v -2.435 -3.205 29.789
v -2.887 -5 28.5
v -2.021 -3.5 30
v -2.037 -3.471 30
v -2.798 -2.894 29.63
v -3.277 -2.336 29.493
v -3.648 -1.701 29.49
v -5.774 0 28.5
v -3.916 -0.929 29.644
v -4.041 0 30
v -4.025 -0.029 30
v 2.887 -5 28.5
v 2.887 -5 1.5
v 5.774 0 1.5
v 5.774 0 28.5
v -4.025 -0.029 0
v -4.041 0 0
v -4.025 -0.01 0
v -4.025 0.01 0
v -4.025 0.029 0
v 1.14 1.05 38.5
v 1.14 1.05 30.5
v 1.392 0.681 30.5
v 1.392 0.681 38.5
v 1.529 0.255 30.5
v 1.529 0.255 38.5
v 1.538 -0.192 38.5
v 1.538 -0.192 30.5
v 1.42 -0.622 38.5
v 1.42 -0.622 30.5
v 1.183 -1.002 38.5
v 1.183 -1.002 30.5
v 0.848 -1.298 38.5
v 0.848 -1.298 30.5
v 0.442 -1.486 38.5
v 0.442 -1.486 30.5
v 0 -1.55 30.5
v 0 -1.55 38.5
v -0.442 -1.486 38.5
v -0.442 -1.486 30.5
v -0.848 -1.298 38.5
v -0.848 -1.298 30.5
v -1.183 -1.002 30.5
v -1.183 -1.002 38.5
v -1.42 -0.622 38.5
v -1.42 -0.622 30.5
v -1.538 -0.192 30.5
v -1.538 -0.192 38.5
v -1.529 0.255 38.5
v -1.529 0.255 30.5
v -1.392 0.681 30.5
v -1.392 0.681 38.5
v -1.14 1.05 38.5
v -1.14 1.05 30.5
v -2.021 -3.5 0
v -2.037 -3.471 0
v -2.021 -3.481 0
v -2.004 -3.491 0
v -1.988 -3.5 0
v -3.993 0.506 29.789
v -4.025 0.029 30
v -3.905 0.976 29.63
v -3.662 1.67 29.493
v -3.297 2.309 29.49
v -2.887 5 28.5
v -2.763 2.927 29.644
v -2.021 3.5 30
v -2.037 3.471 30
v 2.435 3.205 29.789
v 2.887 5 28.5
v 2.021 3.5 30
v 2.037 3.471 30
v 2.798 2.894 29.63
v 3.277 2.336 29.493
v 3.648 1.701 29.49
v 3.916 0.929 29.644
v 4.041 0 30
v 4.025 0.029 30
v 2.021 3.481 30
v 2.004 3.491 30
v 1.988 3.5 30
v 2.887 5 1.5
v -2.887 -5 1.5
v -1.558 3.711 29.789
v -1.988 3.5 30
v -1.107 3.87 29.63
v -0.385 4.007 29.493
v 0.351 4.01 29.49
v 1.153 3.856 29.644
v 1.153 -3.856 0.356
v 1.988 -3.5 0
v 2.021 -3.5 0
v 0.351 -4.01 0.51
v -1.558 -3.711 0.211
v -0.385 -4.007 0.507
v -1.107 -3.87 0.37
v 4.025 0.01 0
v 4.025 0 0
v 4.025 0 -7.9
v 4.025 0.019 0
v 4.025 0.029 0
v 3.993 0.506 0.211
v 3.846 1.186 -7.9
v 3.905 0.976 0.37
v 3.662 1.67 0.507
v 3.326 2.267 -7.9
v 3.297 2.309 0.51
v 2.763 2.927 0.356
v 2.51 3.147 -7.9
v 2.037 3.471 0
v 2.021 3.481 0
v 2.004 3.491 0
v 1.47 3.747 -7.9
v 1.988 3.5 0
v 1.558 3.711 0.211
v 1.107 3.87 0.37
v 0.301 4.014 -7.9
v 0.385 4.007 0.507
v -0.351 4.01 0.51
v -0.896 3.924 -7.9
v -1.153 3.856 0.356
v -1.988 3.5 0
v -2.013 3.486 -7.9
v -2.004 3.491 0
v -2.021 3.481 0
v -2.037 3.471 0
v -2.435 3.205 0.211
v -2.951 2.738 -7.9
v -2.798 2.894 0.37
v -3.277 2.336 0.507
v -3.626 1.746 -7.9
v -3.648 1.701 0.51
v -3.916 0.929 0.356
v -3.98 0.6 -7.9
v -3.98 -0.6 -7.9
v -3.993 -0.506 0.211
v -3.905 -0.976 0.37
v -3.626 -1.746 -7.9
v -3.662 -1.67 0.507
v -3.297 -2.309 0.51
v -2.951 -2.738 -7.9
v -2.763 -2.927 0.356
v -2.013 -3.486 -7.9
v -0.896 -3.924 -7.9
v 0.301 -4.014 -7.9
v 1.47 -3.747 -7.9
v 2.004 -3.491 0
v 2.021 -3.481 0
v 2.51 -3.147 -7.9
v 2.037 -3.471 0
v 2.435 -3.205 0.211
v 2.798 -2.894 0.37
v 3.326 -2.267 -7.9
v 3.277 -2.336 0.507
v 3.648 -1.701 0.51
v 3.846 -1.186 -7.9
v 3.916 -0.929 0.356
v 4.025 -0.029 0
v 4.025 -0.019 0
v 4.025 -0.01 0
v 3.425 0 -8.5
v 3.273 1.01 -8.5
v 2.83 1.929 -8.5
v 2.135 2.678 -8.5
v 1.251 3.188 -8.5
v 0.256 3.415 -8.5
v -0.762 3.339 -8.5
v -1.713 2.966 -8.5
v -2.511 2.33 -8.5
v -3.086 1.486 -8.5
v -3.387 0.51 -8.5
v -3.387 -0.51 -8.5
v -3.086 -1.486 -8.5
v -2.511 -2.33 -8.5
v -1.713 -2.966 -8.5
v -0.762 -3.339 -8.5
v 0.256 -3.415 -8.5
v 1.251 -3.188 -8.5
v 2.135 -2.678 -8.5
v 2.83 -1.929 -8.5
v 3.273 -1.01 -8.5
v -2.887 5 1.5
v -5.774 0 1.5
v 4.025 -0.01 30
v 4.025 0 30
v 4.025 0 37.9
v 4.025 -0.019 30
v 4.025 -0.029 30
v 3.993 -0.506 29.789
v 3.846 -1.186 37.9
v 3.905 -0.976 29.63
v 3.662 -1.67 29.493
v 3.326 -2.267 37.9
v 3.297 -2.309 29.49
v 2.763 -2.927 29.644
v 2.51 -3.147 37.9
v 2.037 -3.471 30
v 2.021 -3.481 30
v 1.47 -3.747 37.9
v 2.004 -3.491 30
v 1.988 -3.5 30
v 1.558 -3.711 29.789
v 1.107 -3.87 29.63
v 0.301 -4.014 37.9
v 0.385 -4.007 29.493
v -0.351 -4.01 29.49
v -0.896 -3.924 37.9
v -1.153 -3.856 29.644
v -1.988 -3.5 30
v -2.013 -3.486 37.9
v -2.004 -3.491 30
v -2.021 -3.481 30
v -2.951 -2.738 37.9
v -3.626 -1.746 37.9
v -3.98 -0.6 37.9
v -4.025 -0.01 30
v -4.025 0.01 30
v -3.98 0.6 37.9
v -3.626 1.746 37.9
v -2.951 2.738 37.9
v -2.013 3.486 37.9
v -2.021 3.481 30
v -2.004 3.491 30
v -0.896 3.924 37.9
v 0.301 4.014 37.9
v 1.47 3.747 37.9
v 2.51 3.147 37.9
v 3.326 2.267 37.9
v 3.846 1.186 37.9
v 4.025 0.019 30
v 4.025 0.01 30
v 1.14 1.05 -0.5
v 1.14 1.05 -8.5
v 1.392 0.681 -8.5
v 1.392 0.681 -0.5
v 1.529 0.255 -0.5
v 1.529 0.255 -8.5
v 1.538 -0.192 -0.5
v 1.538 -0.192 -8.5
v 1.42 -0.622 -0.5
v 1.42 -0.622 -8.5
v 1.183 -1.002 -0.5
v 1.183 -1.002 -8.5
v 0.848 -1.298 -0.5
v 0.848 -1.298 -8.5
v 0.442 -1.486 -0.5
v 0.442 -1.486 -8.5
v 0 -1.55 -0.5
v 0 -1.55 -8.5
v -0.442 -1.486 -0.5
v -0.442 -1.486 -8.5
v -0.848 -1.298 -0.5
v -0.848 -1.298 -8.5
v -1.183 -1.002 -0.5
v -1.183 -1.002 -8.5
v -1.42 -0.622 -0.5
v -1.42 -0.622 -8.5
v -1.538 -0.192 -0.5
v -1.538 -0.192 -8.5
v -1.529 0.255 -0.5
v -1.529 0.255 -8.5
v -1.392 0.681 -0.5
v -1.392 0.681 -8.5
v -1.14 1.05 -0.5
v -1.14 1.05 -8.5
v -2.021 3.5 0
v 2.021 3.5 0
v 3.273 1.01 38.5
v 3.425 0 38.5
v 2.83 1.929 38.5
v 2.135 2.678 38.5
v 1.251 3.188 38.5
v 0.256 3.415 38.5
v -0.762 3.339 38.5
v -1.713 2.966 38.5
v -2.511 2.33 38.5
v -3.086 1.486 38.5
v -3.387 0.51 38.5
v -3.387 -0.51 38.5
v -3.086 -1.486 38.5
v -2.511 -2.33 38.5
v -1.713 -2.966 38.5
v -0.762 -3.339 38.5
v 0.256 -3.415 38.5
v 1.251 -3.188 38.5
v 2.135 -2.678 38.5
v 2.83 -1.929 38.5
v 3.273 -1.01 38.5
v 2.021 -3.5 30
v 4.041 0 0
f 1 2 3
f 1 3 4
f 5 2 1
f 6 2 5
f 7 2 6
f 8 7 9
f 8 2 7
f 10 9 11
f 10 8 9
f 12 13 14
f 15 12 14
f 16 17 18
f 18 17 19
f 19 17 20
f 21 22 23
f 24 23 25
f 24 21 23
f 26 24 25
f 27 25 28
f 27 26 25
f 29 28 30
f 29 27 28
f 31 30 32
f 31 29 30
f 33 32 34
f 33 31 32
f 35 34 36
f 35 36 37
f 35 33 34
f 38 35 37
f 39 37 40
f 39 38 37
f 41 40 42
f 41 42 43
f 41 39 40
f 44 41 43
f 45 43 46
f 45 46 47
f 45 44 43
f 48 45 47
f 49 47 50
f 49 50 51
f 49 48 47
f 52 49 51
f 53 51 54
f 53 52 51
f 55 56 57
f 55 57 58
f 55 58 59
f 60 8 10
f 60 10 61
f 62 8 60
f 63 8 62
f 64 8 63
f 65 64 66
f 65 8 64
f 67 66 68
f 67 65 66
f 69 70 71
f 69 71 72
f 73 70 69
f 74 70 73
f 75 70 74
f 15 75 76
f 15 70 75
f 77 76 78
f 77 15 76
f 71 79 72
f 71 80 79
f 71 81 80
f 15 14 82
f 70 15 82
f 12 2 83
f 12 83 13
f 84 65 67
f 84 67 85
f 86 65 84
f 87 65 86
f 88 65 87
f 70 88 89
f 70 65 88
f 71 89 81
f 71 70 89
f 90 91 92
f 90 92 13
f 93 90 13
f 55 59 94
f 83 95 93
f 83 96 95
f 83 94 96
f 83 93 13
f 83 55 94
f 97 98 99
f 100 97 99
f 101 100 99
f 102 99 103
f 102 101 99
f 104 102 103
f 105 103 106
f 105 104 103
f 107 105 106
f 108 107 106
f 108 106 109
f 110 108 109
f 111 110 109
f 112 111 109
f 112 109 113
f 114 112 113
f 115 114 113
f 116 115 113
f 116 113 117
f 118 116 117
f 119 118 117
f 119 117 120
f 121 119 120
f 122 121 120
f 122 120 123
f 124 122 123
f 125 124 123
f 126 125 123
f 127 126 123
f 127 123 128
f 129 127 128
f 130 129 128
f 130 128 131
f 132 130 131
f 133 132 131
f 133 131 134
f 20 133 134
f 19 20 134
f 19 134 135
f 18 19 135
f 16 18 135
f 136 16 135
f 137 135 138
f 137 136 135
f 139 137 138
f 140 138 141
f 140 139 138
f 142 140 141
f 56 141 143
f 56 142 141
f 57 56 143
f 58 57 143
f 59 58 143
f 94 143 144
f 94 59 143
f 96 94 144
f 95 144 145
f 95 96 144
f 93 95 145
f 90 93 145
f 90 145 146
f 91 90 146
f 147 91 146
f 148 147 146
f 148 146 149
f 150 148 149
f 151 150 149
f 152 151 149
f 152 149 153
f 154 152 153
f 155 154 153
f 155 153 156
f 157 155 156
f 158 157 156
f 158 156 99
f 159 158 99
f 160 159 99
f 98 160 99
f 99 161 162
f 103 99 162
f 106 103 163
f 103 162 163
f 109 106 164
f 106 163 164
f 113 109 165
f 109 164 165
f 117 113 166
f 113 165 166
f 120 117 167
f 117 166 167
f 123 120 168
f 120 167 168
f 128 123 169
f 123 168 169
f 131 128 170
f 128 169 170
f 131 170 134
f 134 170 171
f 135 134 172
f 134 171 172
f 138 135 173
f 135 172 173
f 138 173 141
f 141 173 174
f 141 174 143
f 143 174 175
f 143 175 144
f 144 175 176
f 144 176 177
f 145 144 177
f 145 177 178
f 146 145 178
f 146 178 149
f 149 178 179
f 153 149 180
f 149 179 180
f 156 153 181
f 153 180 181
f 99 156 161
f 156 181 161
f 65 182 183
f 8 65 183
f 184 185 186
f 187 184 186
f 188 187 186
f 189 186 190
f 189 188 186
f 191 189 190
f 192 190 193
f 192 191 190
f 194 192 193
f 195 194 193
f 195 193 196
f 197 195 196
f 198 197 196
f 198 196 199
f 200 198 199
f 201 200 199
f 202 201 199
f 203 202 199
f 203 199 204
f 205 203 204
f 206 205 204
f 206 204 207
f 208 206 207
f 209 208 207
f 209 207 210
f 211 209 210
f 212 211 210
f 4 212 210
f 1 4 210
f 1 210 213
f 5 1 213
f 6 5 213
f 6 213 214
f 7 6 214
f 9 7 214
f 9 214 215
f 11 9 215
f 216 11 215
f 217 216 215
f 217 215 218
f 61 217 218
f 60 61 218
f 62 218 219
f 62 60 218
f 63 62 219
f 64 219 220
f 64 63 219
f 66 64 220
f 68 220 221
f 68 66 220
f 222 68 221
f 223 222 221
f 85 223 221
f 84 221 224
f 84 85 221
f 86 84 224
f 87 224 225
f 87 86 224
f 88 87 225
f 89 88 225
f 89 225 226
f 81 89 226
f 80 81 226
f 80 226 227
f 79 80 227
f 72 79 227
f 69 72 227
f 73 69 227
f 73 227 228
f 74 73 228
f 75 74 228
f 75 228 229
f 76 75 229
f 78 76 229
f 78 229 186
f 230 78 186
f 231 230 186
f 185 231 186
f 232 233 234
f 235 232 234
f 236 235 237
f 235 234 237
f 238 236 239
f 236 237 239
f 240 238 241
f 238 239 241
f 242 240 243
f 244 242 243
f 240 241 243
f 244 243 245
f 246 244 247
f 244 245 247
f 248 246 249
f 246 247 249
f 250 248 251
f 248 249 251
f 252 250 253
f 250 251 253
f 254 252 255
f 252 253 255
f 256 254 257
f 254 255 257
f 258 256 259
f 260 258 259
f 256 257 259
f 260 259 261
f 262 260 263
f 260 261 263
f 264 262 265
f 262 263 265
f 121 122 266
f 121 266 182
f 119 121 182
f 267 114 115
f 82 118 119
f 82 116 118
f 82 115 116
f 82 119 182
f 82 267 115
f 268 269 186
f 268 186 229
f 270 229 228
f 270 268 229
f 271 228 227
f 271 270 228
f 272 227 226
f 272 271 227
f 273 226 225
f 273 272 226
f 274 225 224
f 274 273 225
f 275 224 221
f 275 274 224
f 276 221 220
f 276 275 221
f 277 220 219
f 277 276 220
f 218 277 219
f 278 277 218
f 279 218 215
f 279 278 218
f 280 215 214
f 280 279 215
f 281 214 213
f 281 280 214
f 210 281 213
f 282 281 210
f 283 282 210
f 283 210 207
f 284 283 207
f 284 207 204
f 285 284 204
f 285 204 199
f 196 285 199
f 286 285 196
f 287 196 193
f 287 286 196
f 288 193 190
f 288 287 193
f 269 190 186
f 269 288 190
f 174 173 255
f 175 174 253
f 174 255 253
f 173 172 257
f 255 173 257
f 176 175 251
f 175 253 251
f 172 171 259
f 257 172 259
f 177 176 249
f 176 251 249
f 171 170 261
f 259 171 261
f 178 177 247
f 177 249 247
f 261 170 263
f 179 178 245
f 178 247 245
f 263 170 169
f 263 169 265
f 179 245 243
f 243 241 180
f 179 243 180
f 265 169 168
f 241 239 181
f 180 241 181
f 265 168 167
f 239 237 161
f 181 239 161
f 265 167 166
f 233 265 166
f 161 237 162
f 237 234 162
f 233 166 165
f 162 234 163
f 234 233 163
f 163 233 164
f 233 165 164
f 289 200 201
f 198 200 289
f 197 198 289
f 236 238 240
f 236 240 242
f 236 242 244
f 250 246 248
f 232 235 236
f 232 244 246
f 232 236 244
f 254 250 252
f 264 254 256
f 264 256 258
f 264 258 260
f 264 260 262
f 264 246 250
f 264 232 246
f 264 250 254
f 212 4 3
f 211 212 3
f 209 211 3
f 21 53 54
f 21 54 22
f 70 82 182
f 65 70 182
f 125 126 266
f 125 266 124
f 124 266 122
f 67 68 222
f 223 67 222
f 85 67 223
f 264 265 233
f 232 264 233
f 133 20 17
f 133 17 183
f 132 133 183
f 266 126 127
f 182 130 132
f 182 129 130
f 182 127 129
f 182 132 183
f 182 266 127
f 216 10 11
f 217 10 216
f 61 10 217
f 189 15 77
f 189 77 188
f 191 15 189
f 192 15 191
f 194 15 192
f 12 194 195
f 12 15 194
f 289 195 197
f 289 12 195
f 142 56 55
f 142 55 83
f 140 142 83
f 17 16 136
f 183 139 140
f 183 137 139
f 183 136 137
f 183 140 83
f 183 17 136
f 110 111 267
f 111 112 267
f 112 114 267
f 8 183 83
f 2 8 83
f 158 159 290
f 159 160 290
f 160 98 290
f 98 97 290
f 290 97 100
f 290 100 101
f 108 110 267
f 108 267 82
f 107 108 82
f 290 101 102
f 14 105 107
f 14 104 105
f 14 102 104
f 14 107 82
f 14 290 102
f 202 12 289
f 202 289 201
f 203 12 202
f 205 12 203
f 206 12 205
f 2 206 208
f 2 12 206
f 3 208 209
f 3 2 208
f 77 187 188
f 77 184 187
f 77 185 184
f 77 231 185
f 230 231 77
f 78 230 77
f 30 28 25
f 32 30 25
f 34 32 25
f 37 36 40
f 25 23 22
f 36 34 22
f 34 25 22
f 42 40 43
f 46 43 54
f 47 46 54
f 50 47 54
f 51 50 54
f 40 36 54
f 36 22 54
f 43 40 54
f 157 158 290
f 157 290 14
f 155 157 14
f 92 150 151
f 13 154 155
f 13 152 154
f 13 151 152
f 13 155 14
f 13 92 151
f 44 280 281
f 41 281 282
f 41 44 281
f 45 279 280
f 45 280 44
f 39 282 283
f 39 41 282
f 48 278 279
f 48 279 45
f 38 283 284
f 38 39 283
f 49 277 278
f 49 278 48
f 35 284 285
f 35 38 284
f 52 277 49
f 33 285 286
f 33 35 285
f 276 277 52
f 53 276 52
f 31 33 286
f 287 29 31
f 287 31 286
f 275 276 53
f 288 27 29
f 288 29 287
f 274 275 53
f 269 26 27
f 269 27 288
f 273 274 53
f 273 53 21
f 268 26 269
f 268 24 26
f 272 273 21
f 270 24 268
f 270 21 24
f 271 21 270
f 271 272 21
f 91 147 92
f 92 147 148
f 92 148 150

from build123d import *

# Parameters (mm, degrees)
EXTRUDE_1_DEPTH            = 30
SKETCH_2_R                 = 4.025
EXTRUDE_2_DEPTH            = 8.5
CHAMFER_1_SIZE             = 0.6
CUT_EXTRUDE_1_DEPTH        = 8
CHAMFER_1_OF_MIRROR_1_SIZE = 0.6
CHAMFER_2_SIZE             = 1.5


with BuildPart() as part:
    # 草图1 → 凸台-拉伸1 (new body)
    with BuildSketch(Plane.XY):
        Polygon((5.773502692, 0), (2.886751346, 5), (-2.886751346, 5), (-5.773502692, 0), (-2.886751346, -5), (2.886751346, -5), align=None)
    extrude(amount=EXTRUDE_1_DEPTH)

    # 草图2 → 凸台-拉伸2 (add)
    with BuildSketch(Plane.XY.offset(30)):
        Circle(SKETCH_2_R)
    extrude_2 = extrude(amount=EXTRUDE_2_DEPTH)

    # 倒角1
    chamfer_1_edges = [part.edges().sort_by_distance(p)[0] for p in [
        (-4.025, 0, 38.5),
    ]]
    chamfer(chamfer_1_edges, length=CHAMFER_1_SIZE)

    # 草图3 → 切除-拉伸1 (cut)
    with BuildSketch(Plane.XY.offset(38.5)):
        with BuildLine():
            Line((-1.140175425, 1.05), (1.140175425, 1.05))
            ThreePointArc((1.140175425, 1.05), (0, -1.55), (-1.140175425, 1.05))
        make_face()
    cut_extrude_1 = extrude(amount=-CUT_EXTRUDE_1_DEPTH, mode=Mode.SUBTRACT)

    # 镜向1: 凸台-拉伸2, 切除-拉伸1 across plane
    add(extrude_2.mirror(Plane.XY.offset(15)))
    add(cut_extrude_1.mirror(Plane.XY.offset(15)), mode=Mode.SUBTRACT)

    # 倒角1 of 镜向1
    chamfer_1_of_mirror_1_edges = [part.edges().sort_by_distance(p)[0] for p in [
        (-4.025, 0, -8.5),
    ]]
    chamfer(chamfer_1_of_mirror_1_edges, length=CHAMFER_1_OF_MIRROR_1_SIZE)

    # 倒角2
    # the kernel refuses this chamfer: 1.5 mm, written as the material it takes off along each edge
    with BuildSketch(Plane(origin=(6.744275828, 5, 30), x_dir=(0, 0.02749587661058619, -0.9996219169112968), z_dir=(-1, 0, 0))) as chamfer_2_piece_1_section:
        Polygon((CHAMFER_2_SIZE * 0.999621916911, CHAMFER_2_SIZE * 0.0274958766106), (-CHAMFER_2_SIZE * 0.0274958766106, CHAMFER_2_SIZE * 0.999621916911), (0, 0), align=None)
    chamfer_2_piece_1 = extrude(amount=13.488551656, mode=Mode.PRIVATE)
    chamfer_2_piece_1 = chamfer_2_piece_1 - Plane(origin=(0, 0, 29.496283427), x_dir=(1, 0, 0), z_dir=(0, 0, -1)) * Cylinder(4.025, 33, mode=Mode.PRIVATE)
    add(chamfer_2_piece_1, mode=Mode.SUBTRACT)
    with BuildSketch(Plane(origin=(-0.957989105, 8.340714197, 30), x_dir=(-0.02381212764409015, 0.013747938305292993, -0.9996219169112968), z_dir=(-0.49999999999999506, -0.8660254037844416, 0))) as chamfer_2_piece_2_section:
        Polygon((CHAMFER_2_SIZE * 0.999621916911, CHAMFER_2_SIZE * 0.0274958766106), (-CHAMFER_2_SIZE * 0.0274958766106, CHAMFER_2_SIZE * 0.999621916911), (0, 0), align=None)
    chamfer_2_piece_2 = extrude(amount=13.488551656, mode=Mode.PRIVATE)
    chamfer_2_piece_2 = chamfer_2_piece_2 - Plane(origin=(0, 0, 29.496283427), x_dir=(1, 0, 0), z_dir=(0, 0, -1)) * Cylinder(4.025, 33, mode=Mode.PRIVATE)
    add(chamfer_2_piece_2, mode=Mode.SUBTRACT)
    with BuildSketch(Plane(origin=(-7.702264933, 3.340714197, 30), x_dir=(-0.023812127644089943, -0.013747938305293316, -0.9996219169112968), z_dir=(0.5000000000000071, -0.8660254037844346, 0))) as chamfer_2_piece_3_section:
        Polygon((CHAMFER_2_SIZE * 0.999621916911, CHAMFER_2_SIZE * 0.0274958766106), (-CHAMFER_2_SIZE * 0.0274958766106, CHAMFER_2_SIZE * 0.999621916911), (0, 0), align=None)
    chamfer_2_piece_3 = extrude(amount=13.488551656, mode=Mode.PRIVATE)
    chamfer_2_piece_3 = chamfer_2_piece_3 - Plane(origin=(0, 0, 29.496283427), x_dir=(1, 0, 0), z_dir=(0, 0, -1)) * Cylinder(4.025, 33, mode=Mode.PRIVATE)
    add(chamfer_2_piece_3, mode=Mode.SUBTRACT)
    with BuildSketch(Plane(origin=(-6.744275828, -5, 30), x_dir=(0, -0.02749587661058619, -0.9996219169112968), z_dir=(1, 0, 0))) as chamfer_2_piece_4_section:
        Polygon((CHAMFER_2_SIZE * 0.999621916911, CHAMFER_2_SIZE * 0.0274958766106), (-CHAMFER_2_SIZE * 0.0274958766106, CHAMFER_2_SIZE * 0.999621916911), (0, 0), align=None)
    chamfer_2_piece_4 = extrude(amount=13.488551656, mode=Mode.PRIVATE)
    chamfer_2_piece_4 = chamfer_2_piece_4 - Plane(origin=(0, 0, 29.496283427), x_dir=(1, 0, 0), z_dir=(0, 0, -1)) * Cylinder(4.025, 33, mode=Mode.PRIVATE)
    add(chamfer_2_piece_4, mode=Mode.SUBTRACT)
    with BuildSketch(Plane(origin=(0.957989105, -8.340714197, 30), x_dir=(0.02381212764409026, -0.013747938305293058, -0.9996219169112968), z_dir=(0.49999999999999506, 0.8660254037844416, 0))) as chamfer_2_piece_5_section:
        Polygon((CHAMFER_2_SIZE * 0.999621916911, CHAMFER_2_SIZE * 0.0274958766106), (-CHAMFER_2_SIZE * 0.0274958766106, CHAMFER_2_SIZE * 0.999621916911), (0, 0), align=None)
    chamfer_2_piece_5 = extrude(amount=13.488551656, mode=Mode.PRIVATE)
    chamfer_2_piece_5 = chamfer_2_piece_5 - Plane(origin=(0, 0, 29.496283427), x_dir=(1, 0, 0), z_dir=(0, 0, -1)) * Cylinder(4.025, 33, mode=Mode.PRIVATE)
    add(chamfer_2_piece_5, mode=Mode.SUBTRACT)
    with BuildSketch(Plane(origin=(-6.744275828, -5, 0), x_dir=(-1.0610740769848241e-14, 0.9996219169112969, -0.027495876610586372), z_dir=(1, 0, 0))) as chamfer_2_piece_6_section:
        Polygon((CHAMFER_2_SIZE * 0.999621916911, CHAMFER_2_SIZE * 0.0274958766106), (-CHAMFER_2_SIZE * 0.0274958766106, CHAMFER_2_SIZE * 0.999621916911), (0, 0), align=None)
    chamfer_2_piece_6 = extrude(amount=13.488551656, mode=Mode.PRIVATE)
    chamfer_2_piece_6 = chamfer_2_piece_6 - Plane(origin=(0, 0, 0.503716575), x_dir=(1, 0, 0), z_dir=(0, 0, 1)) * Cylinder(4.025, 33, mode=Mode.PRIVATE)
    add(chamfer_2_piece_6, mode=Mode.SUBTRACT)
    with BuildSketch(Plane(origin=(-7.702264933, 3.340714197, 0), x_dir=(0.8656979742248763, 0.49981095845565543, -0.027495876610586372), z_dir=(0.5000000000000071, -0.8660254037844346, 0))) as chamfer_2_piece_7_section:
        Polygon((CHAMFER_2_SIZE * 0.999621916911, CHAMFER_2_SIZE * 0.0274958766106), (-CHAMFER_2_SIZE * 0.0274958766106, CHAMFER_2_SIZE * 0.999621916911), (0, 0), align=None)
    chamfer_2_piece_7 = extrude(amount=13.488551656, mode=Mode.PRIVATE)
    chamfer_2_piece_7 = chamfer_2_piece_7 - Plane(origin=(0, 0, 0.503716575), x_dir=(1, 0, 0), z_dir=(0, 0, 1)) * Cylinder(4.025, 33, mode=Mode.PRIVATE)
    add(chamfer_2_piece_7, mode=Mode.SUBTRACT)
    with BuildSketch(Plane(origin=(-0.957989105, 8.340714197, 0), x_dir=(0.8656979742248831, -0.4998109584556434, -0.027495876610586365), z_dir=(-0.49999999999999506, -0.8660254037844416, 0))) as chamfer_2_piece_8_section:
        Polygon((CHAMFER_2_SIZE * 0.999621916911, CHAMFER_2_SIZE * 0.0274958766106), (-CHAMFER_2_SIZE * 0.0274958766106, CHAMFER_2_SIZE * 0.999621916911), (0, 0), align=None)
    chamfer_2_piece_8 = extrude(amount=13.488551656, mode=Mode.PRIVATE)
    chamfer_2_piece_8 = chamfer_2_piece_8 - Plane(origin=(0, 0, 0.503716575), x_dir=(1, 0, 0), z_dir=(0, 0, 1)) * Cylinder(4.025, 33, mode=Mode.PRIVATE)
    add(chamfer_2_piece_8, mode=Mode.SUBTRACT)
    with BuildSketch(Plane(origin=(6.744275828, 5, 0), x_dir=(3.2293558864755513e-15, -0.9996219169112969, -0.027495876610586372), z_dir=(-1, 0, 0))) as chamfer_2_piece_9_section:
        Polygon((CHAMFER_2_SIZE * 0.999621916911, CHAMFER_2_SIZE * 0.0274958766106), (-CHAMFER_2_SIZE * 0.0274958766106, CHAMFER_2_SIZE * 0.999621916911), (0, 0), align=None)
    chamfer_2_piece_9 = extrude(amount=13.488551656, mode=Mode.PRIVATE)
    chamfer_2_piece_9 = chamfer_2_piece_9 - Plane(origin=(0, 0, 0.503716575), x_dir=(1, 0, 0), z_dir=(0, 0, 1)) * Cylinder(4.025, 33, mode=Mode.PRIVATE)
    add(chamfer_2_piece_9, mode=Mode.SUBTRACT)
    with BuildSketch(Plane(origin=(7.702264933, -3.340714197, 0), x_dir=(-0.8656979742248797, -0.49981095845564943, -0.027495876610586372), z_dir=(-0.5000000000000011, 0.866025403784438, 0))) as chamfer_2_piece_10_section:
        Polygon((CHAMFER_2_SIZE * 0.999621916911, CHAMFER_2_SIZE * 0.0274958766106), (-CHAMFER_2_SIZE * 0.0274958766106, CHAMFER_2_SIZE * 0.999621916911), (0, 0), align=None)
    chamfer_2_piece_10 = extrude(amount=13.488551656, mode=Mode.PRIVATE)
    chamfer_2_piece_10 = chamfer_2_piece_10 - Plane(origin=(0, 0, 0.503716574), x_dir=(1, 0, 0), z_dir=(0, 0, 1)) * Cylinder(4.025, 33, mode=Mode.PRIVATE)
    add(chamfer_2_piece_10, mode=Mode.SUBTRACT)
    with BuildSketch(Plane(origin=(0.957989105, -8.340714197, 0), x_dir=(-0.8656979742248831, 0.4998109584556434, -0.02749587661058637), z_dir=(0.49999999999999506, 0.8660254037844416, 0))) as chamfer_2_piece_11_section:
        Polygon((CHAMFER_2_SIZE * 0.999621916911, CHAMFER_2_SIZE * 0.0274958766106), (-CHAMFER_2_SIZE * 0.0274958766106, CHAMFER_2_SIZE * 0.999621916911), (0, 0), align=None)
    chamfer_2_piece_11 = extrude(amount=13.488551656, mode=Mode.PRIVATE)
    chamfer_2_piece_11 = chamfer_2_piece_11 - Plane(origin=(0, 0, 0.503716575), x_dir=(1, 0, 0), z_dir=(0, 0, 1)) * Cylinder(4.025, 33, mode=Mode.PRIVATE)
    add(chamfer_2_piece_11, mode=Mode.SUBTRACT)
    with BuildSketch(Plane(origin=(7.702264933, -3.340714197, 30), x_dir=(0.02381212764409016, 0.013747938305293224, -0.9996219169112968), z_dir=(-0.5000000000000011, 0.866025403784438, 0))) as chamfer_2_piece_12_section:
        Polygon((CHAMFER_2_SIZE * 0.999621916911, CHAMFER_2_SIZE * 0.0274958766106), (-CHAMFER_2_SIZE * 0.0274958766106, CHAMFER_2_SIZE * 0.999621916911), (0, 0), align=None)
    chamfer_2_piece_12 = extrude(amount=13.488551656, mode=Mode.PRIVATE)
    chamfer_2_piece_12 = chamfer_2_piece_12 - Plane(origin=(0, 0, 29.496283426), x_dir=(1, 0, 0), z_dir=(0, 0, -1)) * Cylinder(4.025, 33, mode=Mode.PRIVATE)
    add(chamfer_2_piece_12, mode=Mode.SUBTRACT)


solid = part.part
